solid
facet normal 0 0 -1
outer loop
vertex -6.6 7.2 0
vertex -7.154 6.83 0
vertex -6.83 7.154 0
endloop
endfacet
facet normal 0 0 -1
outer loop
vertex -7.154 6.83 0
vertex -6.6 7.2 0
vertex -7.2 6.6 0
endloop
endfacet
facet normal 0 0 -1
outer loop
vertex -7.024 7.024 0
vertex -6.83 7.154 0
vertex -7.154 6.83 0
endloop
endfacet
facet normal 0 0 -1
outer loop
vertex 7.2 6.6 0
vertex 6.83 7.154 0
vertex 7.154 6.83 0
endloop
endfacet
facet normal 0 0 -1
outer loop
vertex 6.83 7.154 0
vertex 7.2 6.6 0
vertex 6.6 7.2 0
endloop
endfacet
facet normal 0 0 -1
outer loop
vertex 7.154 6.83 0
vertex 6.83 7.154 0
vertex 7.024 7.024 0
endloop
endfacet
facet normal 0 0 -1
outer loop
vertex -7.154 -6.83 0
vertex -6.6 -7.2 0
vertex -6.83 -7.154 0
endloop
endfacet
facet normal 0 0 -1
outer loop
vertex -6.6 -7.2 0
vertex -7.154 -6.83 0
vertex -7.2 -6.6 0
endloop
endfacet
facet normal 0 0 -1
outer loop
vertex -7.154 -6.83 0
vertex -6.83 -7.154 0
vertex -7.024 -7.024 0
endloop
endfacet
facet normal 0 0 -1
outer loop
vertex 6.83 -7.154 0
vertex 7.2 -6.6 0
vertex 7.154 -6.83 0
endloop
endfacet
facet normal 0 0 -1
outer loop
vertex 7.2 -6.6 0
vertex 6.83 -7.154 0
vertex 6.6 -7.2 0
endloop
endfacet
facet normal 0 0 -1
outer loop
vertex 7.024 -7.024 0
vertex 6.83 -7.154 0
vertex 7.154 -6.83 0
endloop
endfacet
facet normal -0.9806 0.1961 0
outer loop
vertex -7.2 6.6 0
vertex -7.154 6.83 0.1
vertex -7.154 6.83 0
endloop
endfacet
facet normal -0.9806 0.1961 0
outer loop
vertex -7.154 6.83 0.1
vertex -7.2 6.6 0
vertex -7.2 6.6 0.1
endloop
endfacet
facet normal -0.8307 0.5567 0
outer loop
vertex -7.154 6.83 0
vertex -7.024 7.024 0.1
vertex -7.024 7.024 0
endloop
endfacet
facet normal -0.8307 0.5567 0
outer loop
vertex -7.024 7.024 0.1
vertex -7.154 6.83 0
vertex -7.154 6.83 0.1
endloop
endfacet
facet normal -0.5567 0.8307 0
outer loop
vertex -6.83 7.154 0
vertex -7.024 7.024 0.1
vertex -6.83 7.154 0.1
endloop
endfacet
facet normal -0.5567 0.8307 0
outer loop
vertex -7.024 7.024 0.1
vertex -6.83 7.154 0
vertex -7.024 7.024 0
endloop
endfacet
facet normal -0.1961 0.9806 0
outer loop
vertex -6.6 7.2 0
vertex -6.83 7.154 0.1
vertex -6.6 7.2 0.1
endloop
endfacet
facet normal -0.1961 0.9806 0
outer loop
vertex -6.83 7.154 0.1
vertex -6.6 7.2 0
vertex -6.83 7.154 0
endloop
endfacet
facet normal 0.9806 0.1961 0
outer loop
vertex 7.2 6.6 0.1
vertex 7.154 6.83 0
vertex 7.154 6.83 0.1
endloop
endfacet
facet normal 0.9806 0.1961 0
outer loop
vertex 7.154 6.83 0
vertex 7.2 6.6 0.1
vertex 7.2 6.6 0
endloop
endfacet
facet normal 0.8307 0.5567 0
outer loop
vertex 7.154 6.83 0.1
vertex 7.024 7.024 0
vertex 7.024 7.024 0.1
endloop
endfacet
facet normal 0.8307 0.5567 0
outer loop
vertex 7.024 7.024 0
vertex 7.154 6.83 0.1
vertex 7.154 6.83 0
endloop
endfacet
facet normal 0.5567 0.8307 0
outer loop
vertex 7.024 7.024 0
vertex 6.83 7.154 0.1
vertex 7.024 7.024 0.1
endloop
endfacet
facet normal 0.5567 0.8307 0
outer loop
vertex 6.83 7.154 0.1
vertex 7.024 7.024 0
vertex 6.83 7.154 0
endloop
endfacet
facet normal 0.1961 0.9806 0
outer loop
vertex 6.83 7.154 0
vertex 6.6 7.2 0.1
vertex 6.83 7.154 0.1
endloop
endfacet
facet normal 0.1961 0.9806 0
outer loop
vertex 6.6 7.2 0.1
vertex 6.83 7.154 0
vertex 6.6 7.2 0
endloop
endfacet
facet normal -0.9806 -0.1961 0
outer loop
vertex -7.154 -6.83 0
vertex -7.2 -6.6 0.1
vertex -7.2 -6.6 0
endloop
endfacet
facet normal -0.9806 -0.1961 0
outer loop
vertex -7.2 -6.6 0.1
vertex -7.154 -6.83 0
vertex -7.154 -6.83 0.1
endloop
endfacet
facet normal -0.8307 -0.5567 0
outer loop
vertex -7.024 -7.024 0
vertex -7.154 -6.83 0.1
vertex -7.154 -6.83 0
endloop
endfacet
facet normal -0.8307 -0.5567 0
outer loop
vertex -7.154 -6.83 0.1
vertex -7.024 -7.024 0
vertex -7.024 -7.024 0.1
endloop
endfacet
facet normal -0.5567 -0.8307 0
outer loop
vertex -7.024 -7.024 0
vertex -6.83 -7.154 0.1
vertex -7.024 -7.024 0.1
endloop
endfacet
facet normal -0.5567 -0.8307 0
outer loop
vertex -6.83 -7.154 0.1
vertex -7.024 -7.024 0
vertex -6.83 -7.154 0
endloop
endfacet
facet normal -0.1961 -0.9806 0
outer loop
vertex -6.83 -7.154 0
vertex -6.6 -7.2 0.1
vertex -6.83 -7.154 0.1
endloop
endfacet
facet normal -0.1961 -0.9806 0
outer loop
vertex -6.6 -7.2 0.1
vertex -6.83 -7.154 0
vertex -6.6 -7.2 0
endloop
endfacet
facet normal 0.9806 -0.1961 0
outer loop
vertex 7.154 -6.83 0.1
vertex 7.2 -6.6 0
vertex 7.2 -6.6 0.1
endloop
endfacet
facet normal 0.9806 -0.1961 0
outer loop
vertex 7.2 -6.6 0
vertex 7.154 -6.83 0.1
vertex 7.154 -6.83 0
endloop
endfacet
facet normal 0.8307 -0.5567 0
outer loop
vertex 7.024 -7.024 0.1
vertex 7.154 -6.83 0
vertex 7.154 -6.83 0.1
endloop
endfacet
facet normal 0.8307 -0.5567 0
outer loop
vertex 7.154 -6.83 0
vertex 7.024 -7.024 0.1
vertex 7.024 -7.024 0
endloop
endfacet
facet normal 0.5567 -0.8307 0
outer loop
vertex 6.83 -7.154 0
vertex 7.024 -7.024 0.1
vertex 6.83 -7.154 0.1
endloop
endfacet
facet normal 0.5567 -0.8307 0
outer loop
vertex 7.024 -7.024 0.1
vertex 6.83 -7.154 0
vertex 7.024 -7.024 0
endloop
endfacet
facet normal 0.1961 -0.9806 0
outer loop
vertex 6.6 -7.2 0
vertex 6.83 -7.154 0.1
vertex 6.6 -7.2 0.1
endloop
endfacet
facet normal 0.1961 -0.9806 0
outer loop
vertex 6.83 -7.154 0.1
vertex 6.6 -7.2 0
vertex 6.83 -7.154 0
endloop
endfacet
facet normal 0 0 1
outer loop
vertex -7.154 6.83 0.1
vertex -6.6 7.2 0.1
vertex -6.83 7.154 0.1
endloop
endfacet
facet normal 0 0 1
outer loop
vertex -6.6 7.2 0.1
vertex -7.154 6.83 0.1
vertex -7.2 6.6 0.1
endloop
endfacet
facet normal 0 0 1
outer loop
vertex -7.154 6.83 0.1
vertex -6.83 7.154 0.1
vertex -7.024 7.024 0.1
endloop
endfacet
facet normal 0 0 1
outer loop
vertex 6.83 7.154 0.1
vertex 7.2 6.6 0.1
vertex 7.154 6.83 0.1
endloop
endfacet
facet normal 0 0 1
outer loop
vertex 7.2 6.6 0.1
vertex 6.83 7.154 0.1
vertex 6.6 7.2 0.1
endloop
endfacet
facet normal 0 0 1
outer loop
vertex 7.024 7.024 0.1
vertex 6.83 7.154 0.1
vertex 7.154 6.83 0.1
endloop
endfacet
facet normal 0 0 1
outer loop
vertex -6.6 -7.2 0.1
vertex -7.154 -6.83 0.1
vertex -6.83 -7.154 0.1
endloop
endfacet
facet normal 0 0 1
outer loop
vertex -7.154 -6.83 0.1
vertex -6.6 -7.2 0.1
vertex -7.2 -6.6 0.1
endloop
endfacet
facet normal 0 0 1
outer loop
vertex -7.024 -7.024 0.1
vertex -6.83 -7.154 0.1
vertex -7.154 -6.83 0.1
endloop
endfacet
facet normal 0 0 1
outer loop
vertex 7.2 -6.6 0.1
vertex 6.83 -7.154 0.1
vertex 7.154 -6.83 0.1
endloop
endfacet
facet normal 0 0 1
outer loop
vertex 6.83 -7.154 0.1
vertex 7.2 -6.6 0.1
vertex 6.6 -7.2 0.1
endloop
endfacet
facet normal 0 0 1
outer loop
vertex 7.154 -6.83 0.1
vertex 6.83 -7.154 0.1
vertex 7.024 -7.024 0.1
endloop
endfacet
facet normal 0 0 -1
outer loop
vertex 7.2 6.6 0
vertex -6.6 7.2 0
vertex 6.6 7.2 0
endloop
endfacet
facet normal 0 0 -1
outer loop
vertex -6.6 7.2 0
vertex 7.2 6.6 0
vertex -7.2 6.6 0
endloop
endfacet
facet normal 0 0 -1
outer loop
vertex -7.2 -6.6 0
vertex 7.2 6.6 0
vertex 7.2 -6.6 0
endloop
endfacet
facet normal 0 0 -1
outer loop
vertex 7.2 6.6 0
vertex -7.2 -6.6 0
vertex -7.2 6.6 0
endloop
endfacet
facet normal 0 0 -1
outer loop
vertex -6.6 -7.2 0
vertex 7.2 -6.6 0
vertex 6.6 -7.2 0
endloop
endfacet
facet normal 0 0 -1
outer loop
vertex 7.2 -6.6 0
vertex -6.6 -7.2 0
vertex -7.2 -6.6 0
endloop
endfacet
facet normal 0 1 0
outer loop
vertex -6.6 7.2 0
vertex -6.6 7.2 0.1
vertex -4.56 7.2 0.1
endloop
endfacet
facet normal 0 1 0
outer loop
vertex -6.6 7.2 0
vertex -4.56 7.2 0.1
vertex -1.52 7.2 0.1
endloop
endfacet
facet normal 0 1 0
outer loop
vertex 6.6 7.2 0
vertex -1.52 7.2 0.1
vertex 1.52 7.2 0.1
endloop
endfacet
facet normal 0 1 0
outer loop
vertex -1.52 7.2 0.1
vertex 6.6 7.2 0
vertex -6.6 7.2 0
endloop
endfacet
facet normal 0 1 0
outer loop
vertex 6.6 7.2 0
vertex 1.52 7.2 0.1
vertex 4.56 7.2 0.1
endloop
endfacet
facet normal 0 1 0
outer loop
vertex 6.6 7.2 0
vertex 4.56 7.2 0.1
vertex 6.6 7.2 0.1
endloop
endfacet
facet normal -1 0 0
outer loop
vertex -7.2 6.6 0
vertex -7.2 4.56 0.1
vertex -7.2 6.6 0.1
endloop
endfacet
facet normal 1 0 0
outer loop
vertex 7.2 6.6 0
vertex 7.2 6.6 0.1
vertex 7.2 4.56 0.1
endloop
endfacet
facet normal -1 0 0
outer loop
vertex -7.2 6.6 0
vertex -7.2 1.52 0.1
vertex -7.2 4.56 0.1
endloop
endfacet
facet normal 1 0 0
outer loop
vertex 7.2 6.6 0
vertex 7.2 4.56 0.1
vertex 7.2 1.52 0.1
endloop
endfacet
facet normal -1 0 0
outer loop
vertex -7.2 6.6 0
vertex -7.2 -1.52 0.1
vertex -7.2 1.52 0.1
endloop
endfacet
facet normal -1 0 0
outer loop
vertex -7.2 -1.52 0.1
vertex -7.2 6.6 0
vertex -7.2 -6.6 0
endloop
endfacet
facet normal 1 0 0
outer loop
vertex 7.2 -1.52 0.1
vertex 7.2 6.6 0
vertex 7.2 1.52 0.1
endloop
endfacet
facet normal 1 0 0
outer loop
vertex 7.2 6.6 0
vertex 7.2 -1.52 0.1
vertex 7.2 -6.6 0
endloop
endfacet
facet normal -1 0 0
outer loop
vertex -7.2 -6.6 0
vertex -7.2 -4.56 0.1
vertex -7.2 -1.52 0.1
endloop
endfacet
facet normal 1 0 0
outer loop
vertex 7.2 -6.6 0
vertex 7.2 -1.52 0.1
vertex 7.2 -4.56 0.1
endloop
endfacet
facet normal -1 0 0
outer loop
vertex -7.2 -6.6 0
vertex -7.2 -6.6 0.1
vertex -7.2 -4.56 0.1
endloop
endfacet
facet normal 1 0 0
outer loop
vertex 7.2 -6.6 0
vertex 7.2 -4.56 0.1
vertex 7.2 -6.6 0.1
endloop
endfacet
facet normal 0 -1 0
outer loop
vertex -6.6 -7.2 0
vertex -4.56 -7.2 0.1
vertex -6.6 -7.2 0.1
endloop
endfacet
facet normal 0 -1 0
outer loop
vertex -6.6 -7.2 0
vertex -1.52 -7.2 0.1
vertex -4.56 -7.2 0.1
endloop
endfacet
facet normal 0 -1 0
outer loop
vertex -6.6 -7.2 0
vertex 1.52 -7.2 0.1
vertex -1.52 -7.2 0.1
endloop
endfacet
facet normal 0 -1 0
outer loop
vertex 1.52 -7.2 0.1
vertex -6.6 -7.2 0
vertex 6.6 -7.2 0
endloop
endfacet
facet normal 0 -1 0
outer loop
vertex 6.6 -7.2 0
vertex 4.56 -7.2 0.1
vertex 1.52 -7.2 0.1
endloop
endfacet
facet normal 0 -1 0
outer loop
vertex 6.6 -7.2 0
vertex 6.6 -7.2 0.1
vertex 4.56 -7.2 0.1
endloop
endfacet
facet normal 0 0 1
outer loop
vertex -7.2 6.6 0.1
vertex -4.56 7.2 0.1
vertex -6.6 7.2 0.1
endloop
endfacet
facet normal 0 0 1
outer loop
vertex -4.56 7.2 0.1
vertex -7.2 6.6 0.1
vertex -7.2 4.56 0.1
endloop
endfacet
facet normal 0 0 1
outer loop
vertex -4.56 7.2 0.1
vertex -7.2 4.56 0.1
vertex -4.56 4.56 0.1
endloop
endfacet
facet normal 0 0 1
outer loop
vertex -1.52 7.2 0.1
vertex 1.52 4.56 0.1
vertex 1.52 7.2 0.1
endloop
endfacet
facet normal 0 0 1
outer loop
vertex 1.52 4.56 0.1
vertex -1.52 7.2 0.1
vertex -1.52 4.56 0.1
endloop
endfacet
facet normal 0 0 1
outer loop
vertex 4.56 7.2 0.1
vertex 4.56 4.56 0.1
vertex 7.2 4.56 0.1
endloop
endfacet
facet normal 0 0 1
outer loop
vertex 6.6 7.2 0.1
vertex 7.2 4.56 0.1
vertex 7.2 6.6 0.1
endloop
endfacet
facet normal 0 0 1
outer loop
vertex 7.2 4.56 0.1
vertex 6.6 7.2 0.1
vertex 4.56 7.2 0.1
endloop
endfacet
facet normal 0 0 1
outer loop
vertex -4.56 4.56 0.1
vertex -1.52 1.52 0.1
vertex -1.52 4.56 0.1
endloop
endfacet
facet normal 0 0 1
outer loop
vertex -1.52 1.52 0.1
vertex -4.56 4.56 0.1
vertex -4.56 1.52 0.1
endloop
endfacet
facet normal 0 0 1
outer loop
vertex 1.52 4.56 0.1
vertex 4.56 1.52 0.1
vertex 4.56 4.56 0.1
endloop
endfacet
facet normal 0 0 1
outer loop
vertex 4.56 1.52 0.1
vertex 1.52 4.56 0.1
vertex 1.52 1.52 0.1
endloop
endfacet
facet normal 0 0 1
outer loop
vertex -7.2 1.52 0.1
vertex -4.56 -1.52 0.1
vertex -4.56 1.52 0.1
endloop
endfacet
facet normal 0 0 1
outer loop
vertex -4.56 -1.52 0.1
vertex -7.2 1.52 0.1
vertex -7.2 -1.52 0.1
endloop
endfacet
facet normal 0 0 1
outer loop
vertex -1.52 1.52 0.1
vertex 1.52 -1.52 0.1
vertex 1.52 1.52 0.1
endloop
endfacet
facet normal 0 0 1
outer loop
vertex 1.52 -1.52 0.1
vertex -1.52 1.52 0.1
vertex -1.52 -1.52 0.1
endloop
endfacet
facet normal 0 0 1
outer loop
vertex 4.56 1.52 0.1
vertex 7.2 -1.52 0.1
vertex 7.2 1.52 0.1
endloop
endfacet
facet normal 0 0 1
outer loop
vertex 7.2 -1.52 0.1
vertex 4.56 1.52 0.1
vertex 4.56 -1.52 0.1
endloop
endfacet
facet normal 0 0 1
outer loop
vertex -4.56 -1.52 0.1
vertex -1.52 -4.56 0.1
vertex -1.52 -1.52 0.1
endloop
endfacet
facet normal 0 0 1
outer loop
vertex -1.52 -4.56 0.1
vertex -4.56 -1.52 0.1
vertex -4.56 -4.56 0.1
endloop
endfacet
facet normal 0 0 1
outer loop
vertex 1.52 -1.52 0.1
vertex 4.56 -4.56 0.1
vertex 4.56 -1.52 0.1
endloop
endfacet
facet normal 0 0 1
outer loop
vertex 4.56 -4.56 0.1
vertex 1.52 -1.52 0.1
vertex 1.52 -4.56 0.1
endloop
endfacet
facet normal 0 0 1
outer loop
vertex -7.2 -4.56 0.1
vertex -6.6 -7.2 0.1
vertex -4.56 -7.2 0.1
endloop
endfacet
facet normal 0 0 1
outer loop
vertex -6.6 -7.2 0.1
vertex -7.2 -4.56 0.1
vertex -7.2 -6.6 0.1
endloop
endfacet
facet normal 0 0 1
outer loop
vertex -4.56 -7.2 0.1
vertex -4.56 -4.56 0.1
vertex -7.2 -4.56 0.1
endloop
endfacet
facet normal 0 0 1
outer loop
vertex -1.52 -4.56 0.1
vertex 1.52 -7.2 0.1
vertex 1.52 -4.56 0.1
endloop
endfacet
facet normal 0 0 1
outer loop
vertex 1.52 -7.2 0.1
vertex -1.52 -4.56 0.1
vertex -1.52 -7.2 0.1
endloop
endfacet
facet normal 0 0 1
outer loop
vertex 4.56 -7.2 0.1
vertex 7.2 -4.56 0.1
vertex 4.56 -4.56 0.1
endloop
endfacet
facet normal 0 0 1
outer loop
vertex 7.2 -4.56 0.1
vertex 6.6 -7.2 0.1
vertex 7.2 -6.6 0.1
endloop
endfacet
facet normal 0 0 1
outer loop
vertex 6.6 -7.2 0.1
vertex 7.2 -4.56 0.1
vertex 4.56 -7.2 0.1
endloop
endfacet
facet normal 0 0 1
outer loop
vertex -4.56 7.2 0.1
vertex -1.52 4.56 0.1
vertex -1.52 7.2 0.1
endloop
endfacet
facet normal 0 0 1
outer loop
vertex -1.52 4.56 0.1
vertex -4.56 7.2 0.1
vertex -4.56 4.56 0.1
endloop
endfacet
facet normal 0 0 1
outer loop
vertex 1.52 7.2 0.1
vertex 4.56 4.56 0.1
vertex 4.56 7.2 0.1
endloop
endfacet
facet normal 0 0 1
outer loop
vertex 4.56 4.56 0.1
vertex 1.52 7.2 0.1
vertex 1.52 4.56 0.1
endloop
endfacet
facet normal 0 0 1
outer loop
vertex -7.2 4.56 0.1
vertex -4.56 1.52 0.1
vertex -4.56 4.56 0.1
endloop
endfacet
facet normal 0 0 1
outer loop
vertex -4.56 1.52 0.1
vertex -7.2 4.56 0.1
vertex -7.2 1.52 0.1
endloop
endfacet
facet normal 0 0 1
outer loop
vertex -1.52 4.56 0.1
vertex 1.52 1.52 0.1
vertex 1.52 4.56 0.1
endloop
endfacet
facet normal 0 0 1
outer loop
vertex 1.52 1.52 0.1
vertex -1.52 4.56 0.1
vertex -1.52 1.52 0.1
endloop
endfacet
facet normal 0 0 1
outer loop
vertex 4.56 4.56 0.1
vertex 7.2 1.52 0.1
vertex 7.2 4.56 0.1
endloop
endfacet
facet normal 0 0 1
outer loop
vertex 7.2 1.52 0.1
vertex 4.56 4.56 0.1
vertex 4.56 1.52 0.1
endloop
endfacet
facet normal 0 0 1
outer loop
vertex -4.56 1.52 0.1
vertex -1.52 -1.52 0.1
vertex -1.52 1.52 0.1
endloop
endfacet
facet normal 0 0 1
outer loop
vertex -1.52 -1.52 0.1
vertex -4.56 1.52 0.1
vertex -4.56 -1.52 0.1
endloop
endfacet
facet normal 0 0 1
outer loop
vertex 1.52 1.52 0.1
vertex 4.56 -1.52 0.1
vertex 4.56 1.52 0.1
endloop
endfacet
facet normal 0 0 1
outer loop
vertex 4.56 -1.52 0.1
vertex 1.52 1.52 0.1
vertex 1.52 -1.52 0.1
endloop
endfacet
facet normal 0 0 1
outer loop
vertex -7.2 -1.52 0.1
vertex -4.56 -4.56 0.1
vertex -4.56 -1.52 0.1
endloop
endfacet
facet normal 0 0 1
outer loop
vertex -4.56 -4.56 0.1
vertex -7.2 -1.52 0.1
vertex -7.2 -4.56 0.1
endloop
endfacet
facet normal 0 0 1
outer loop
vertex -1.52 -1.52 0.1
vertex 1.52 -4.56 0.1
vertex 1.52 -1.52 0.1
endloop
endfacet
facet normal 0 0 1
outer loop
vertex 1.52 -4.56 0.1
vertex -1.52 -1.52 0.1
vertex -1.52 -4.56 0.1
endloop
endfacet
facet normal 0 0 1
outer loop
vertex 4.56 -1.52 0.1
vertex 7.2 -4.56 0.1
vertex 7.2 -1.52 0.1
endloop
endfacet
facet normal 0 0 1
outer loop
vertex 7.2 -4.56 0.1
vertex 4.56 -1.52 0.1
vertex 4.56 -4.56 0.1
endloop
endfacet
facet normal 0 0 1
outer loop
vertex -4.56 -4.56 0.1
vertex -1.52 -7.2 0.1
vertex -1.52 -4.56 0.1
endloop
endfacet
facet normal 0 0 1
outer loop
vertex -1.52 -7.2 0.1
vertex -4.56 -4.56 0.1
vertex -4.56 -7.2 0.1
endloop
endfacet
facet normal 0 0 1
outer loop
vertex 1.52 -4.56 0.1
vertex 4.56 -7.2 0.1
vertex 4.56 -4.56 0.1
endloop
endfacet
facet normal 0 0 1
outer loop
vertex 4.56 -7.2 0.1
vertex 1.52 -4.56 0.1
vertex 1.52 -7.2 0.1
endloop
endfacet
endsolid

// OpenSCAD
// file: ../p/1-4cyli.scad
use <../lib.scad>
function ldraw_lib__1_4cyli() = [
// 0 Cylinder 0.25
// 0 Name: 1-4cyli.dat
// 0 Author: James Jessiman
// 0 !LDRAW_ORG Primitive UPDATE 2012-01
// 0 !LICENSE Licensed under CC BY 4.0 : see CAreadme.txt
// 
// 0 BFC CERTIFY CCW
  [0,"BFC","CERTIFY"],
  [0,"BFC","CCW"],
// 
// 0 !HISTORY 2002-03-23 [sbliss] Added BFC statement.
// 0 !HISTORY 2002-04-25 [PTadmin] Official Update 2002-02
// 0 !HISTORY 2007-06-22 [PTadmin] Header formatted for Contributor Agreement
// 0 !HISTORY 2008-07-01 [PTadmin] Official Update 2008-01
// 0 !HISTORY 2012-02-16 [Philo] Changed to CCW
// 0 !HISTORY 2012-03-30 [PTadmin] Official Update 2012-01
// 
// 
// 4 16 1 1 0 0.9239 1 0.3827 0.9239 0 0.3827 1 0 0
  [4,16,1,1,0,0.9239,1,0.3827,0.9239,0,0.3827,1,0,0],
// 5 24 1 0 0 1 1 0 0.9239 0 0.3827 1 0 -1
  [5,24,1,0,0,1,1,0,0.9239,0,0.3827,1,0,-1],
// 4 16 0.9239 1 0.3827 0.7071 1 0.7071 0.7071 0 0.7071 0.9239 0 0.3827
  [4,16,0.9239,1,0.3827,0.7071,1,0.7071,0.7071,0,0.7071,0.9239,0,0.3827],
// 5 24 0.9239 0 0.3827 0.9239 1 0.3827 0.7071 0 0.7071 1 0 0
  [5,24,0.9239,0,0.3827,0.9239,1,0.3827,0.7071,0,0.7071,1,0,0],
// 4 16 0.7071 1 0.7071 0.3827 1 0.9239 0.3827 0 0.9239 0.7071 0 0.7071
  [4,16,0.7071,1,0.7071,0.3827,1,0.9239,0.3827,0,0.9239,0.7071,0,0.7071],
// 5 24 0.7071 0 0.7071 0.7071 1 0.7071 0.3827 0 0.9239 0.9239 0 0.3827
  [5,24,0.7071,0,0.7071,0.7071,1,0.7071,0.3827,0,0.9239,0.9239,0,0.3827],
// 4 16 0.3827 1 0.9239 0 1 1 0 0 1 0.3827 0 0.9239
  [4,16,0.3827,1,0.9239,0,1,1,0,0,1,0.3827,0,0.9239],
// 5 24 0.3827 0 0.9239 0.3827 1 0.9239 0 0 1 0.7071 0 0.7071
  [5,24,0.3827,0,0.9239,0.3827,1,0.9239,0,0,1,0.7071,0,0.7071],
// 5 24 0 0 1 0 1 1 0.3827 0 0.9239 -1 0 1
  [5,24,0,0,1,0,1,1,0.3827,0,0.9239,-1,0,1],
];
module ldraw_lib__1_4cyli(step=0, col=false, unit=2/5, alt=false, line=0.2, solid=!$preview)
    makepoly(ldraw_lib__1_4cyli(), step=step, col=col, unit=unit, alt=alt, line=line, solid=solid);
ldraw_lib__1_4cyli(line=0.2);
// file: ../p/1-4chrd.scad
use <../lib.scad>
function ldraw_lib__1_4chrd() = [
// 0 Chord 0.25
// 0 Name: 1-4chrd.dat
// 0 Author: Max Martin Richter [MMR1988]
// 0 !LDRAW_ORG Primitive UPDATE 2023-05
// 0 !LICENSE Licensed under CC BY 4.0 : see CAreadme.txt
// 
// 0 BFC CERTIFY CCW
  [0,"BFC","CERTIFY"],
  [0,"BFC","CCW"],
// 
// 0 !HISTORY 2004-04-22 [PTadmin] Official Update 2004-02
// 0 !HISTORY 2007-10-09 [PTadmin] Header formatted for Contributor Agreement
// 0 !HISTORY 2008-07-01 [PTadmin] Official Update 2008-01
// 0 !HISTORY 2012-08-02 [MMR1988] Re-creation with PrimGen2 and Rectifier
// 0 !HISTORY 2012-08-09 [PTadmin] Official Update 2012-02
// 0 !HISTORY 2023-10-27 [OrionP] Change author to MMR1988 from hafhead
// 0 !HISTORY 2023-10-31 [OrionP] Official Update 2023-05
// 
// 4 16 0.9239 0 0.3827 0.3827 0 0.9239 0 0 1 1 0 0
  [4,16,0.9239,0,0.3827,0.3827,0,0.9239,0,0,1,1,0,0],
// 3 16 0.7071 0 0.7071 0.3827 0 0.9239 0.9239 0 0.3827
  [3,16,0.7071,0,0.7071,0.3827,0,0.9239,0.9239,0,0.3827],
];
module ldraw_lib__1_4chrd(step=0, col=false, unit=2/5, alt=false, line=0.2, solid=!$preview)
    makepoly(ldraw_lib__1_4chrd(), step=step, col=col, unit=unit, alt=alt, line=line, solid=solid);
ldraw_lib__1_4chrd(line=0.2);
// main file
use <../lib.scad>
use <6142617z.scad>
function ldraw_lib__6177973o() = [
// 0 =Sticker  1.8 x  1.8 Chequered
// 0 Name: 6177973o.dat
// 0 Author: Massimo Maso [Sirio]
// 0 !LDRAW_ORG Part Alias UPDATE 2026-09
// 0 !LICENSE Licensed under CC BY 4.0 : see CAreadme.txt
// 
// 0 BFC CERTIFY CCW
  [0,"BFC","CERTIFY"],
  [0,"BFC","CCW"],
// 
// 0 !CATEGORY Sticker
// 0 !KEYWORDS 2016, 44, 6, AMG, BrickLink 75883stk01, Brickowl 129746, F1, Formula
// 0 !KEYWORDS Hamilton, Hybrid, Lewis, Mercedes, Nico, One, Petronas
// 0 !KEYWORDS Rebrickable 30901, Rosberg, Set 75883, Speed Champions, Team, Toto
// 0 !KEYWORDS W07, Wolff
// 
// 0 !HISTORY 2026-09-30 [OrionP] Official Update 2026-09
// 
// 1 16 0 0 0 1 0 0 0 1 0 0 0 1 6142617z.dat
  [1,16,0,0,0,1,0,0,0,1,0,0,0,1, ldraw_lib__6142617z()],
];
module ldraw_lib__6177973o(step=0, col=false, unit=2/5, alt=false, line=0.2, solid=!$preview)
    makepoly(ldraw_lib__6177973o(), step=step, col=col, unit=unit, alt=alt, line=line, solid=solid);
ldraw_lib__6177973o(line=0.2);
